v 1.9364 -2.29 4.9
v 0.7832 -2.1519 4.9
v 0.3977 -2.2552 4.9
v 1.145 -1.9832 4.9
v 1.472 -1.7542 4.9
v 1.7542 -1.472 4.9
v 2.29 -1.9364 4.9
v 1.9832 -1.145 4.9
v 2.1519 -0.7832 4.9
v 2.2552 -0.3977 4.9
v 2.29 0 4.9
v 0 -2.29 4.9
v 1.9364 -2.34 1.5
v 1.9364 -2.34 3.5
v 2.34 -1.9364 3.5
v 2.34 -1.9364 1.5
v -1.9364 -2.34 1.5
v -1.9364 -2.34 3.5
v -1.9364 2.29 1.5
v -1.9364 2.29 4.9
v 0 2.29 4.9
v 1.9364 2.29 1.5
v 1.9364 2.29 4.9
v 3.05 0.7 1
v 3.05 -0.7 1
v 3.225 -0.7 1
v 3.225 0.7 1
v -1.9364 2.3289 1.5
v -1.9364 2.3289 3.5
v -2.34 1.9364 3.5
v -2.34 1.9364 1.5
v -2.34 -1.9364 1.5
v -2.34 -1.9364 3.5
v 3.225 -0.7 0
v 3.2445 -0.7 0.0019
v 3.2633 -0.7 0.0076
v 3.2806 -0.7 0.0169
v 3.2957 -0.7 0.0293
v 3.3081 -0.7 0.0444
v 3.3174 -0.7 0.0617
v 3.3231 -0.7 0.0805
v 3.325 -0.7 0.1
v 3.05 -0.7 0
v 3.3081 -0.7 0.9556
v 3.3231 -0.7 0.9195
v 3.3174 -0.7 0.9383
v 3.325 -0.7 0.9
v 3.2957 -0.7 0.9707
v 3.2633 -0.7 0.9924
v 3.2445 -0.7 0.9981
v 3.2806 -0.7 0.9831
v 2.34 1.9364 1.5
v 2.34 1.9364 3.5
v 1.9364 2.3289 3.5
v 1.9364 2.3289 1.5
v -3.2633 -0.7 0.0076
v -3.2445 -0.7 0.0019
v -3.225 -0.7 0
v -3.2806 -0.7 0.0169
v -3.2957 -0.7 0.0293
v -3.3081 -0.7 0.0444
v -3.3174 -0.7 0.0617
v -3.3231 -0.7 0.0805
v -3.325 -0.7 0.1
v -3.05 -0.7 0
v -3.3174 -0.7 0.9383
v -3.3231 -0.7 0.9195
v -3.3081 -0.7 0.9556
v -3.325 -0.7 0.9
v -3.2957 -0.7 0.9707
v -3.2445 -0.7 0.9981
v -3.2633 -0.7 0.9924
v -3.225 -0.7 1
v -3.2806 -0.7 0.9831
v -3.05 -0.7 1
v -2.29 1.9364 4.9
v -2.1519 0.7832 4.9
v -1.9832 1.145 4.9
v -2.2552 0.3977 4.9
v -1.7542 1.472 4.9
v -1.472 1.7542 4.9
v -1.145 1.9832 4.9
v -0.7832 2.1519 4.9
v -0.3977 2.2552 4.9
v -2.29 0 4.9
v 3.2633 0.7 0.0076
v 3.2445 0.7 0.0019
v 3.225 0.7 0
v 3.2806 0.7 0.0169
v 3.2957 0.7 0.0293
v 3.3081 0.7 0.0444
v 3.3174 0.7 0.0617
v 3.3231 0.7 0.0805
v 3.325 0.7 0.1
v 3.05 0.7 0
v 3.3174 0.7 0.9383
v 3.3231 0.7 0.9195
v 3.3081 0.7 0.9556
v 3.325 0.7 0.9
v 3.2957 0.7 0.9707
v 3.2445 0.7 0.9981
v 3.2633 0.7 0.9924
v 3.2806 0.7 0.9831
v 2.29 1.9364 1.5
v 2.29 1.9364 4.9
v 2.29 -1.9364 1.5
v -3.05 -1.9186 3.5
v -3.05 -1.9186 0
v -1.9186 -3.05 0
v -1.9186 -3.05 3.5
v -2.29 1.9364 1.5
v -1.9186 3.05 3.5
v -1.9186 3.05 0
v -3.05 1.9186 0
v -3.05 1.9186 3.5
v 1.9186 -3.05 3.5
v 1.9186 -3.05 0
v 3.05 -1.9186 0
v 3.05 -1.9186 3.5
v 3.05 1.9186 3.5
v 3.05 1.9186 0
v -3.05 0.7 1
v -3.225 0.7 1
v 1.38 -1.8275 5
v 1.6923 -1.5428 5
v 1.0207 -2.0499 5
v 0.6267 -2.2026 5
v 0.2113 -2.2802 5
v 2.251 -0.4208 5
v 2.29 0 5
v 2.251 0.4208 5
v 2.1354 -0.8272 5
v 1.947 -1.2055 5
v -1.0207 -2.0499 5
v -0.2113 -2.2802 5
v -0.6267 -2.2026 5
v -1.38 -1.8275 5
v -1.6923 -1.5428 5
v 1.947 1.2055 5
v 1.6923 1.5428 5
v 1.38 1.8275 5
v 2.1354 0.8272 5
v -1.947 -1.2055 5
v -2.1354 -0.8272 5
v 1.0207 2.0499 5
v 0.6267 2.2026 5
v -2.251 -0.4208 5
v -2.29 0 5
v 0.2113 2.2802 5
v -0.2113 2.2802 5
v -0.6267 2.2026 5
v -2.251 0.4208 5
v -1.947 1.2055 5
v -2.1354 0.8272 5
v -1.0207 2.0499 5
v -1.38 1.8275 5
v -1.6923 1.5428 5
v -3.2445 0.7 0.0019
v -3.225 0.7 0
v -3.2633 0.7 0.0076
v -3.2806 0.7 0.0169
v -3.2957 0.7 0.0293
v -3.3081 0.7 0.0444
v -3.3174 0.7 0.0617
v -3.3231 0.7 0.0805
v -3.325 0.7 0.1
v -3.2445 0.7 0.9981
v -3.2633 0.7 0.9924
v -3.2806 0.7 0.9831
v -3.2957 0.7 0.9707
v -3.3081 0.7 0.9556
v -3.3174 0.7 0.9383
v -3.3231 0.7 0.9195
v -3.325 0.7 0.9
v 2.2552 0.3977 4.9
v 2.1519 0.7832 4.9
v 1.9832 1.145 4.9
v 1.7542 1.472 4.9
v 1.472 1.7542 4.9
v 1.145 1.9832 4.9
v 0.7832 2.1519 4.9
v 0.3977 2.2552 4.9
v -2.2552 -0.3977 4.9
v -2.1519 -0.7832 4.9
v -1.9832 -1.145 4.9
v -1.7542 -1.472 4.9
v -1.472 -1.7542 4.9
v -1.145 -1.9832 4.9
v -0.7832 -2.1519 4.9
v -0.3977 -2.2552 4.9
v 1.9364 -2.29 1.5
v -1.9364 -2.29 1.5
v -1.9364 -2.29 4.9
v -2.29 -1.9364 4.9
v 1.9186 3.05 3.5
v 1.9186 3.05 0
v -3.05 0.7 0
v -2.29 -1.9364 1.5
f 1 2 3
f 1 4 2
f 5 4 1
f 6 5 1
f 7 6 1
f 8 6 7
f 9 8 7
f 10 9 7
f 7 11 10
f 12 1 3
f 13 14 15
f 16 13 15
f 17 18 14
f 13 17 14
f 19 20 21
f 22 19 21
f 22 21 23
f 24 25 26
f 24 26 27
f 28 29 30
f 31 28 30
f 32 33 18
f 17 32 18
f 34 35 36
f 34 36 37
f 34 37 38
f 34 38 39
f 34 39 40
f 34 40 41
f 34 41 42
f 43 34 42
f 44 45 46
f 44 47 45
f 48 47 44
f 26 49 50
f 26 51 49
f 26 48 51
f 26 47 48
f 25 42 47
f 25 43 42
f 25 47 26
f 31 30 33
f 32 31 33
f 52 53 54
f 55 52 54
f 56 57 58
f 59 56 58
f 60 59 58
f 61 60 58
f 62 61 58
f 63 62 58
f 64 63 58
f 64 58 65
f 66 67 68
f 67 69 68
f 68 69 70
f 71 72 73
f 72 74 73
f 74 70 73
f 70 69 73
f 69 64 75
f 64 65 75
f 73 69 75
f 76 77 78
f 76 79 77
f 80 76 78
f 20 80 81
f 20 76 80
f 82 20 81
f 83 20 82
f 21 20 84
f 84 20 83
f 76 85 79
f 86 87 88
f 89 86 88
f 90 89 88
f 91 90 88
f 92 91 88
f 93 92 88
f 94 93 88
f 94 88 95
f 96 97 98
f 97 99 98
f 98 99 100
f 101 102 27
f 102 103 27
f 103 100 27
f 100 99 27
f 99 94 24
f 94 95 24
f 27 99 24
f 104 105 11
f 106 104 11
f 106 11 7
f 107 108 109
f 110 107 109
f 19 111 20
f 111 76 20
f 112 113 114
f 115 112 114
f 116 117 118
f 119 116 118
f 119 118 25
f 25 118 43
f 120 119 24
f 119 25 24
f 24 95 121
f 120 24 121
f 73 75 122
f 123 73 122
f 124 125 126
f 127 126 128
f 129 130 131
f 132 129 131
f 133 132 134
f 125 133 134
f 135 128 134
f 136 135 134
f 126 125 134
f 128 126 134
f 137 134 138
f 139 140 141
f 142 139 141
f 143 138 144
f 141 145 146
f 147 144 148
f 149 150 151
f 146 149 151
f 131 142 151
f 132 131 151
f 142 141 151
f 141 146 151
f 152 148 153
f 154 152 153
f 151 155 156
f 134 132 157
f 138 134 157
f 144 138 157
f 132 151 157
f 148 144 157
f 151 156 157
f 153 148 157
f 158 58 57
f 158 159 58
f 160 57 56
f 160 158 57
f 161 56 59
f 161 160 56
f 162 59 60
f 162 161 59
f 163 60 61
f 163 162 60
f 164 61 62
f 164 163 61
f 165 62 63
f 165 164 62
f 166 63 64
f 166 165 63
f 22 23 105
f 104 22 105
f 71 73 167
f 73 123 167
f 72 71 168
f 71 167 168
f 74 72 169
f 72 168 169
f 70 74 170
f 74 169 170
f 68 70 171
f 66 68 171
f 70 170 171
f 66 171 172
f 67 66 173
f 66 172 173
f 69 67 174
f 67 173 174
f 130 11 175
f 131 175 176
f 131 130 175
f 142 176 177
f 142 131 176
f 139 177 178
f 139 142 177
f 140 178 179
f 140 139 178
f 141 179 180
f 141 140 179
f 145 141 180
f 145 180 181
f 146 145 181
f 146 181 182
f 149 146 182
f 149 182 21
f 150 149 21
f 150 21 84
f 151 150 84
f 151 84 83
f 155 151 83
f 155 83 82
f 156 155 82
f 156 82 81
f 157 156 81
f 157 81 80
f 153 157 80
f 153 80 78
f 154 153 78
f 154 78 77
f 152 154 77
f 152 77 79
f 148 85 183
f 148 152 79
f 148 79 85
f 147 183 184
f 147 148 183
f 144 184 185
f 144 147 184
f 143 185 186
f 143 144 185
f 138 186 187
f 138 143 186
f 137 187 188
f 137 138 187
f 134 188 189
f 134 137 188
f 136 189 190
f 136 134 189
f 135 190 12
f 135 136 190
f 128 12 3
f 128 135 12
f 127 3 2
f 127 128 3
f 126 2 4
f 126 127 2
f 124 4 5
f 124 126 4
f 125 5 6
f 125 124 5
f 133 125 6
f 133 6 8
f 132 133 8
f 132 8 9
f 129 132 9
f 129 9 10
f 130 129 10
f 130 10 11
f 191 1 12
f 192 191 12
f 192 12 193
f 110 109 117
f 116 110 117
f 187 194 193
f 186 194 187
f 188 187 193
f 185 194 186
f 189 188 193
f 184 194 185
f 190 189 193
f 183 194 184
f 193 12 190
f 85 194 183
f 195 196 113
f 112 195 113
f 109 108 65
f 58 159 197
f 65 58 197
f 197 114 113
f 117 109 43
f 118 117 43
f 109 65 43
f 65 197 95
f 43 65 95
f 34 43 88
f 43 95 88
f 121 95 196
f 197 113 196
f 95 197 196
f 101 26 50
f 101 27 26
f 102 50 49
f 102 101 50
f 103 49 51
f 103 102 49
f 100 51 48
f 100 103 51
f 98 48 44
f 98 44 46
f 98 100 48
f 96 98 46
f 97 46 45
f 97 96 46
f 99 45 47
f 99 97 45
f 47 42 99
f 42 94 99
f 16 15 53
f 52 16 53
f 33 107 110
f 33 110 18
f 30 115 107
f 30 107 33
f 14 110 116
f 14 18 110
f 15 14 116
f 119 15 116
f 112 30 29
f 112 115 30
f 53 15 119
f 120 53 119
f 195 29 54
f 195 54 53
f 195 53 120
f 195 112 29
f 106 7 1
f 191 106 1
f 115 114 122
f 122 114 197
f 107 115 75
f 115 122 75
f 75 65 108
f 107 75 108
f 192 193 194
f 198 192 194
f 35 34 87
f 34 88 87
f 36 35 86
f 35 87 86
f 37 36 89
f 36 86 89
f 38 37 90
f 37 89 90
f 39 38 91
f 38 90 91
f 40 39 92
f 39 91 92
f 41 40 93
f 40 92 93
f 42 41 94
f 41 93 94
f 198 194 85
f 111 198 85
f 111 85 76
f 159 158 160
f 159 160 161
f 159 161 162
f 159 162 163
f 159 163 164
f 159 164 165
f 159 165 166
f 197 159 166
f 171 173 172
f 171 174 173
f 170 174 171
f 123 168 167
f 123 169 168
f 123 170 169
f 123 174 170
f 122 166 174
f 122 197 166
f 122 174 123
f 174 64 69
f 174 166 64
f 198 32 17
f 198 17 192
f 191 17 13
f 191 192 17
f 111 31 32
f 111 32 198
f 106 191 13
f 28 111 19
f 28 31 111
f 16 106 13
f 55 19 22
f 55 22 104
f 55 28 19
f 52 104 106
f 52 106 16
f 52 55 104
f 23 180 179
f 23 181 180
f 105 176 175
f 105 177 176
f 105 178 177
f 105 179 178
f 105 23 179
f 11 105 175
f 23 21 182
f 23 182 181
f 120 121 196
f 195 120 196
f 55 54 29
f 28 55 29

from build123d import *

# Parameters (mm, degrees)
EXTRUDE_1_DEPTH        = 3.5
EXTRUDE_2_DEPTH        = 1.5
SKETCH_3_OUTSIDE_W     = 10.094
SKETCH_3_OUTSIDE_H     = 10.094
SKETCH_3_OUTSIDE_R     = 2.29
CUT_EXTRUDE_1_DEPTH    = 0.1
SKETCH_4_W             = 1
SKETCH_4_H             = 1.4
EXTRUDE_3_DEPTH        = 0.275
FILLET_1_R             = 0.1
FILLET_1_OF_MIRROR_1_R = 0.1
CUT_EXTRUDE_2_DEPTH    = 2


with BuildPart() as part:
    # 草图1 → 凸台-拉伸1 (new body)
    with BuildSketch(Plane.XY):
        Polygon((-1.91862915, -3.05), (1.91862915, -3.05), (3.05, -1.91862915), (3.05, 1.91862915), (1.91862915, 3.05), (-1.91862915, 3.05), (-3.05, 1.91862915), (-3.05, -1.91862915), align=None)
    extrude(amount=EXTRUDE_1_DEPTH)

    # 草图2 → 凸台-拉伸2 (add)
    with BuildSketch(Plane.XY.offset(3.5)):
        Polygon((2.29, -1.936446609), (1.936446609, -2.29), (-1.936446609, -2.29), (-2.29, -1.936446609), (-2.29, 1.936446609), (-1.936446609, 2.29), (1.936446609, 2.29), (2.29, 1.936446609), align=None)
    extrude(amount=EXTRUDE_2_DEPTH)

    # 草图3 outside → 切除-拉伸1 (cut)
    with BuildSketch(Plane.XY.offset(5)):
        Rectangle(SKETCH_3_OUTSIDE_W, SKETCH_3_OUTSIDE_H)
        Circle(SKETCH_3_OUTSIDE_R, mode=Mode.SUBTRACT)
    cut_extrude_1 = extrude(amount=-CUT_EXTRUDE_1_DEPTH, mode=Mode.SUBTRACT)

    # 草图4 → 凸台-拉伸3 (add)
    with BuildSketch(Plane.ZY.offset(3.05)):
        with Locations((0.5, 0)):
            Rectangle(SKETCH_4_W, SKETCH_4_H)
    extrude_3 = extrude(amount=EXTRUDE_3_DEPTH)

    # 圆角1
    fillet_1_edges = [part.edges().sort_by_distance(p)[0] for p in [
        (-3.325, 0, 1),
        (-3.325, 0, 0),
    ]]
    fillet(fillet_1_edges, radius=FILLET_1_R)

    # 镜向1: 切除-拉伸1, 凸台-拉伸3 across plane
    add(cut_extrude_1.mirror(Plane(origin=(0, 0, 0), x_dir=(0, 0, 1), z_dir=(1, 0, 0))), mode=Mode.SUBTRACT)
    add(extrude_3.mirror(Plane(origin=(0, 0, 0), x_dir=(0, 0, 1), z_dir=(1, 0, 0))))

    # 圆角1 of 镜向1
    fillet_1_of_mirror_1_edges = [part.edges().sort_by_distance(p)[0] for p in [
        (3.325, 0, 1),
        (3.325, 0, 0),
    ]]
    fillet(fillet_1_of_mirror_1_edges, radius=FILLET_1_OF_MIRROR_1_R)

    # 草图5 → 切除-拉伸2 (cut)
    with BuildSketch(Plane.XY.offset(3.5)):
        Polygon((-2.34, 1.936446609), (-2.34, -1.936446609), (-1.936446609, -2.34), (1.936446609, -2.34), (2.34, -1.936446609), (2.34, 1.936446609), (1.936446609, 2.328890946), (-1.936446609, 2.328890946), align=None)
        Polygon((-2.29, 1.936446609), (-1.936446609, 2.29), (1.936446609, 2.29), (2.29, 1.936446609), (2.29, -1.936446609), (1.936446609, -2.29), (-1.936446609, -2.29), (-2.29, -1.936446609), align=None, mode=Mode.SUBTRACT)
    extrude(amount=-CUT_EXTRUDE_2_DEPTH, mode=Mode.SUBTRACT)


solid = part.part
